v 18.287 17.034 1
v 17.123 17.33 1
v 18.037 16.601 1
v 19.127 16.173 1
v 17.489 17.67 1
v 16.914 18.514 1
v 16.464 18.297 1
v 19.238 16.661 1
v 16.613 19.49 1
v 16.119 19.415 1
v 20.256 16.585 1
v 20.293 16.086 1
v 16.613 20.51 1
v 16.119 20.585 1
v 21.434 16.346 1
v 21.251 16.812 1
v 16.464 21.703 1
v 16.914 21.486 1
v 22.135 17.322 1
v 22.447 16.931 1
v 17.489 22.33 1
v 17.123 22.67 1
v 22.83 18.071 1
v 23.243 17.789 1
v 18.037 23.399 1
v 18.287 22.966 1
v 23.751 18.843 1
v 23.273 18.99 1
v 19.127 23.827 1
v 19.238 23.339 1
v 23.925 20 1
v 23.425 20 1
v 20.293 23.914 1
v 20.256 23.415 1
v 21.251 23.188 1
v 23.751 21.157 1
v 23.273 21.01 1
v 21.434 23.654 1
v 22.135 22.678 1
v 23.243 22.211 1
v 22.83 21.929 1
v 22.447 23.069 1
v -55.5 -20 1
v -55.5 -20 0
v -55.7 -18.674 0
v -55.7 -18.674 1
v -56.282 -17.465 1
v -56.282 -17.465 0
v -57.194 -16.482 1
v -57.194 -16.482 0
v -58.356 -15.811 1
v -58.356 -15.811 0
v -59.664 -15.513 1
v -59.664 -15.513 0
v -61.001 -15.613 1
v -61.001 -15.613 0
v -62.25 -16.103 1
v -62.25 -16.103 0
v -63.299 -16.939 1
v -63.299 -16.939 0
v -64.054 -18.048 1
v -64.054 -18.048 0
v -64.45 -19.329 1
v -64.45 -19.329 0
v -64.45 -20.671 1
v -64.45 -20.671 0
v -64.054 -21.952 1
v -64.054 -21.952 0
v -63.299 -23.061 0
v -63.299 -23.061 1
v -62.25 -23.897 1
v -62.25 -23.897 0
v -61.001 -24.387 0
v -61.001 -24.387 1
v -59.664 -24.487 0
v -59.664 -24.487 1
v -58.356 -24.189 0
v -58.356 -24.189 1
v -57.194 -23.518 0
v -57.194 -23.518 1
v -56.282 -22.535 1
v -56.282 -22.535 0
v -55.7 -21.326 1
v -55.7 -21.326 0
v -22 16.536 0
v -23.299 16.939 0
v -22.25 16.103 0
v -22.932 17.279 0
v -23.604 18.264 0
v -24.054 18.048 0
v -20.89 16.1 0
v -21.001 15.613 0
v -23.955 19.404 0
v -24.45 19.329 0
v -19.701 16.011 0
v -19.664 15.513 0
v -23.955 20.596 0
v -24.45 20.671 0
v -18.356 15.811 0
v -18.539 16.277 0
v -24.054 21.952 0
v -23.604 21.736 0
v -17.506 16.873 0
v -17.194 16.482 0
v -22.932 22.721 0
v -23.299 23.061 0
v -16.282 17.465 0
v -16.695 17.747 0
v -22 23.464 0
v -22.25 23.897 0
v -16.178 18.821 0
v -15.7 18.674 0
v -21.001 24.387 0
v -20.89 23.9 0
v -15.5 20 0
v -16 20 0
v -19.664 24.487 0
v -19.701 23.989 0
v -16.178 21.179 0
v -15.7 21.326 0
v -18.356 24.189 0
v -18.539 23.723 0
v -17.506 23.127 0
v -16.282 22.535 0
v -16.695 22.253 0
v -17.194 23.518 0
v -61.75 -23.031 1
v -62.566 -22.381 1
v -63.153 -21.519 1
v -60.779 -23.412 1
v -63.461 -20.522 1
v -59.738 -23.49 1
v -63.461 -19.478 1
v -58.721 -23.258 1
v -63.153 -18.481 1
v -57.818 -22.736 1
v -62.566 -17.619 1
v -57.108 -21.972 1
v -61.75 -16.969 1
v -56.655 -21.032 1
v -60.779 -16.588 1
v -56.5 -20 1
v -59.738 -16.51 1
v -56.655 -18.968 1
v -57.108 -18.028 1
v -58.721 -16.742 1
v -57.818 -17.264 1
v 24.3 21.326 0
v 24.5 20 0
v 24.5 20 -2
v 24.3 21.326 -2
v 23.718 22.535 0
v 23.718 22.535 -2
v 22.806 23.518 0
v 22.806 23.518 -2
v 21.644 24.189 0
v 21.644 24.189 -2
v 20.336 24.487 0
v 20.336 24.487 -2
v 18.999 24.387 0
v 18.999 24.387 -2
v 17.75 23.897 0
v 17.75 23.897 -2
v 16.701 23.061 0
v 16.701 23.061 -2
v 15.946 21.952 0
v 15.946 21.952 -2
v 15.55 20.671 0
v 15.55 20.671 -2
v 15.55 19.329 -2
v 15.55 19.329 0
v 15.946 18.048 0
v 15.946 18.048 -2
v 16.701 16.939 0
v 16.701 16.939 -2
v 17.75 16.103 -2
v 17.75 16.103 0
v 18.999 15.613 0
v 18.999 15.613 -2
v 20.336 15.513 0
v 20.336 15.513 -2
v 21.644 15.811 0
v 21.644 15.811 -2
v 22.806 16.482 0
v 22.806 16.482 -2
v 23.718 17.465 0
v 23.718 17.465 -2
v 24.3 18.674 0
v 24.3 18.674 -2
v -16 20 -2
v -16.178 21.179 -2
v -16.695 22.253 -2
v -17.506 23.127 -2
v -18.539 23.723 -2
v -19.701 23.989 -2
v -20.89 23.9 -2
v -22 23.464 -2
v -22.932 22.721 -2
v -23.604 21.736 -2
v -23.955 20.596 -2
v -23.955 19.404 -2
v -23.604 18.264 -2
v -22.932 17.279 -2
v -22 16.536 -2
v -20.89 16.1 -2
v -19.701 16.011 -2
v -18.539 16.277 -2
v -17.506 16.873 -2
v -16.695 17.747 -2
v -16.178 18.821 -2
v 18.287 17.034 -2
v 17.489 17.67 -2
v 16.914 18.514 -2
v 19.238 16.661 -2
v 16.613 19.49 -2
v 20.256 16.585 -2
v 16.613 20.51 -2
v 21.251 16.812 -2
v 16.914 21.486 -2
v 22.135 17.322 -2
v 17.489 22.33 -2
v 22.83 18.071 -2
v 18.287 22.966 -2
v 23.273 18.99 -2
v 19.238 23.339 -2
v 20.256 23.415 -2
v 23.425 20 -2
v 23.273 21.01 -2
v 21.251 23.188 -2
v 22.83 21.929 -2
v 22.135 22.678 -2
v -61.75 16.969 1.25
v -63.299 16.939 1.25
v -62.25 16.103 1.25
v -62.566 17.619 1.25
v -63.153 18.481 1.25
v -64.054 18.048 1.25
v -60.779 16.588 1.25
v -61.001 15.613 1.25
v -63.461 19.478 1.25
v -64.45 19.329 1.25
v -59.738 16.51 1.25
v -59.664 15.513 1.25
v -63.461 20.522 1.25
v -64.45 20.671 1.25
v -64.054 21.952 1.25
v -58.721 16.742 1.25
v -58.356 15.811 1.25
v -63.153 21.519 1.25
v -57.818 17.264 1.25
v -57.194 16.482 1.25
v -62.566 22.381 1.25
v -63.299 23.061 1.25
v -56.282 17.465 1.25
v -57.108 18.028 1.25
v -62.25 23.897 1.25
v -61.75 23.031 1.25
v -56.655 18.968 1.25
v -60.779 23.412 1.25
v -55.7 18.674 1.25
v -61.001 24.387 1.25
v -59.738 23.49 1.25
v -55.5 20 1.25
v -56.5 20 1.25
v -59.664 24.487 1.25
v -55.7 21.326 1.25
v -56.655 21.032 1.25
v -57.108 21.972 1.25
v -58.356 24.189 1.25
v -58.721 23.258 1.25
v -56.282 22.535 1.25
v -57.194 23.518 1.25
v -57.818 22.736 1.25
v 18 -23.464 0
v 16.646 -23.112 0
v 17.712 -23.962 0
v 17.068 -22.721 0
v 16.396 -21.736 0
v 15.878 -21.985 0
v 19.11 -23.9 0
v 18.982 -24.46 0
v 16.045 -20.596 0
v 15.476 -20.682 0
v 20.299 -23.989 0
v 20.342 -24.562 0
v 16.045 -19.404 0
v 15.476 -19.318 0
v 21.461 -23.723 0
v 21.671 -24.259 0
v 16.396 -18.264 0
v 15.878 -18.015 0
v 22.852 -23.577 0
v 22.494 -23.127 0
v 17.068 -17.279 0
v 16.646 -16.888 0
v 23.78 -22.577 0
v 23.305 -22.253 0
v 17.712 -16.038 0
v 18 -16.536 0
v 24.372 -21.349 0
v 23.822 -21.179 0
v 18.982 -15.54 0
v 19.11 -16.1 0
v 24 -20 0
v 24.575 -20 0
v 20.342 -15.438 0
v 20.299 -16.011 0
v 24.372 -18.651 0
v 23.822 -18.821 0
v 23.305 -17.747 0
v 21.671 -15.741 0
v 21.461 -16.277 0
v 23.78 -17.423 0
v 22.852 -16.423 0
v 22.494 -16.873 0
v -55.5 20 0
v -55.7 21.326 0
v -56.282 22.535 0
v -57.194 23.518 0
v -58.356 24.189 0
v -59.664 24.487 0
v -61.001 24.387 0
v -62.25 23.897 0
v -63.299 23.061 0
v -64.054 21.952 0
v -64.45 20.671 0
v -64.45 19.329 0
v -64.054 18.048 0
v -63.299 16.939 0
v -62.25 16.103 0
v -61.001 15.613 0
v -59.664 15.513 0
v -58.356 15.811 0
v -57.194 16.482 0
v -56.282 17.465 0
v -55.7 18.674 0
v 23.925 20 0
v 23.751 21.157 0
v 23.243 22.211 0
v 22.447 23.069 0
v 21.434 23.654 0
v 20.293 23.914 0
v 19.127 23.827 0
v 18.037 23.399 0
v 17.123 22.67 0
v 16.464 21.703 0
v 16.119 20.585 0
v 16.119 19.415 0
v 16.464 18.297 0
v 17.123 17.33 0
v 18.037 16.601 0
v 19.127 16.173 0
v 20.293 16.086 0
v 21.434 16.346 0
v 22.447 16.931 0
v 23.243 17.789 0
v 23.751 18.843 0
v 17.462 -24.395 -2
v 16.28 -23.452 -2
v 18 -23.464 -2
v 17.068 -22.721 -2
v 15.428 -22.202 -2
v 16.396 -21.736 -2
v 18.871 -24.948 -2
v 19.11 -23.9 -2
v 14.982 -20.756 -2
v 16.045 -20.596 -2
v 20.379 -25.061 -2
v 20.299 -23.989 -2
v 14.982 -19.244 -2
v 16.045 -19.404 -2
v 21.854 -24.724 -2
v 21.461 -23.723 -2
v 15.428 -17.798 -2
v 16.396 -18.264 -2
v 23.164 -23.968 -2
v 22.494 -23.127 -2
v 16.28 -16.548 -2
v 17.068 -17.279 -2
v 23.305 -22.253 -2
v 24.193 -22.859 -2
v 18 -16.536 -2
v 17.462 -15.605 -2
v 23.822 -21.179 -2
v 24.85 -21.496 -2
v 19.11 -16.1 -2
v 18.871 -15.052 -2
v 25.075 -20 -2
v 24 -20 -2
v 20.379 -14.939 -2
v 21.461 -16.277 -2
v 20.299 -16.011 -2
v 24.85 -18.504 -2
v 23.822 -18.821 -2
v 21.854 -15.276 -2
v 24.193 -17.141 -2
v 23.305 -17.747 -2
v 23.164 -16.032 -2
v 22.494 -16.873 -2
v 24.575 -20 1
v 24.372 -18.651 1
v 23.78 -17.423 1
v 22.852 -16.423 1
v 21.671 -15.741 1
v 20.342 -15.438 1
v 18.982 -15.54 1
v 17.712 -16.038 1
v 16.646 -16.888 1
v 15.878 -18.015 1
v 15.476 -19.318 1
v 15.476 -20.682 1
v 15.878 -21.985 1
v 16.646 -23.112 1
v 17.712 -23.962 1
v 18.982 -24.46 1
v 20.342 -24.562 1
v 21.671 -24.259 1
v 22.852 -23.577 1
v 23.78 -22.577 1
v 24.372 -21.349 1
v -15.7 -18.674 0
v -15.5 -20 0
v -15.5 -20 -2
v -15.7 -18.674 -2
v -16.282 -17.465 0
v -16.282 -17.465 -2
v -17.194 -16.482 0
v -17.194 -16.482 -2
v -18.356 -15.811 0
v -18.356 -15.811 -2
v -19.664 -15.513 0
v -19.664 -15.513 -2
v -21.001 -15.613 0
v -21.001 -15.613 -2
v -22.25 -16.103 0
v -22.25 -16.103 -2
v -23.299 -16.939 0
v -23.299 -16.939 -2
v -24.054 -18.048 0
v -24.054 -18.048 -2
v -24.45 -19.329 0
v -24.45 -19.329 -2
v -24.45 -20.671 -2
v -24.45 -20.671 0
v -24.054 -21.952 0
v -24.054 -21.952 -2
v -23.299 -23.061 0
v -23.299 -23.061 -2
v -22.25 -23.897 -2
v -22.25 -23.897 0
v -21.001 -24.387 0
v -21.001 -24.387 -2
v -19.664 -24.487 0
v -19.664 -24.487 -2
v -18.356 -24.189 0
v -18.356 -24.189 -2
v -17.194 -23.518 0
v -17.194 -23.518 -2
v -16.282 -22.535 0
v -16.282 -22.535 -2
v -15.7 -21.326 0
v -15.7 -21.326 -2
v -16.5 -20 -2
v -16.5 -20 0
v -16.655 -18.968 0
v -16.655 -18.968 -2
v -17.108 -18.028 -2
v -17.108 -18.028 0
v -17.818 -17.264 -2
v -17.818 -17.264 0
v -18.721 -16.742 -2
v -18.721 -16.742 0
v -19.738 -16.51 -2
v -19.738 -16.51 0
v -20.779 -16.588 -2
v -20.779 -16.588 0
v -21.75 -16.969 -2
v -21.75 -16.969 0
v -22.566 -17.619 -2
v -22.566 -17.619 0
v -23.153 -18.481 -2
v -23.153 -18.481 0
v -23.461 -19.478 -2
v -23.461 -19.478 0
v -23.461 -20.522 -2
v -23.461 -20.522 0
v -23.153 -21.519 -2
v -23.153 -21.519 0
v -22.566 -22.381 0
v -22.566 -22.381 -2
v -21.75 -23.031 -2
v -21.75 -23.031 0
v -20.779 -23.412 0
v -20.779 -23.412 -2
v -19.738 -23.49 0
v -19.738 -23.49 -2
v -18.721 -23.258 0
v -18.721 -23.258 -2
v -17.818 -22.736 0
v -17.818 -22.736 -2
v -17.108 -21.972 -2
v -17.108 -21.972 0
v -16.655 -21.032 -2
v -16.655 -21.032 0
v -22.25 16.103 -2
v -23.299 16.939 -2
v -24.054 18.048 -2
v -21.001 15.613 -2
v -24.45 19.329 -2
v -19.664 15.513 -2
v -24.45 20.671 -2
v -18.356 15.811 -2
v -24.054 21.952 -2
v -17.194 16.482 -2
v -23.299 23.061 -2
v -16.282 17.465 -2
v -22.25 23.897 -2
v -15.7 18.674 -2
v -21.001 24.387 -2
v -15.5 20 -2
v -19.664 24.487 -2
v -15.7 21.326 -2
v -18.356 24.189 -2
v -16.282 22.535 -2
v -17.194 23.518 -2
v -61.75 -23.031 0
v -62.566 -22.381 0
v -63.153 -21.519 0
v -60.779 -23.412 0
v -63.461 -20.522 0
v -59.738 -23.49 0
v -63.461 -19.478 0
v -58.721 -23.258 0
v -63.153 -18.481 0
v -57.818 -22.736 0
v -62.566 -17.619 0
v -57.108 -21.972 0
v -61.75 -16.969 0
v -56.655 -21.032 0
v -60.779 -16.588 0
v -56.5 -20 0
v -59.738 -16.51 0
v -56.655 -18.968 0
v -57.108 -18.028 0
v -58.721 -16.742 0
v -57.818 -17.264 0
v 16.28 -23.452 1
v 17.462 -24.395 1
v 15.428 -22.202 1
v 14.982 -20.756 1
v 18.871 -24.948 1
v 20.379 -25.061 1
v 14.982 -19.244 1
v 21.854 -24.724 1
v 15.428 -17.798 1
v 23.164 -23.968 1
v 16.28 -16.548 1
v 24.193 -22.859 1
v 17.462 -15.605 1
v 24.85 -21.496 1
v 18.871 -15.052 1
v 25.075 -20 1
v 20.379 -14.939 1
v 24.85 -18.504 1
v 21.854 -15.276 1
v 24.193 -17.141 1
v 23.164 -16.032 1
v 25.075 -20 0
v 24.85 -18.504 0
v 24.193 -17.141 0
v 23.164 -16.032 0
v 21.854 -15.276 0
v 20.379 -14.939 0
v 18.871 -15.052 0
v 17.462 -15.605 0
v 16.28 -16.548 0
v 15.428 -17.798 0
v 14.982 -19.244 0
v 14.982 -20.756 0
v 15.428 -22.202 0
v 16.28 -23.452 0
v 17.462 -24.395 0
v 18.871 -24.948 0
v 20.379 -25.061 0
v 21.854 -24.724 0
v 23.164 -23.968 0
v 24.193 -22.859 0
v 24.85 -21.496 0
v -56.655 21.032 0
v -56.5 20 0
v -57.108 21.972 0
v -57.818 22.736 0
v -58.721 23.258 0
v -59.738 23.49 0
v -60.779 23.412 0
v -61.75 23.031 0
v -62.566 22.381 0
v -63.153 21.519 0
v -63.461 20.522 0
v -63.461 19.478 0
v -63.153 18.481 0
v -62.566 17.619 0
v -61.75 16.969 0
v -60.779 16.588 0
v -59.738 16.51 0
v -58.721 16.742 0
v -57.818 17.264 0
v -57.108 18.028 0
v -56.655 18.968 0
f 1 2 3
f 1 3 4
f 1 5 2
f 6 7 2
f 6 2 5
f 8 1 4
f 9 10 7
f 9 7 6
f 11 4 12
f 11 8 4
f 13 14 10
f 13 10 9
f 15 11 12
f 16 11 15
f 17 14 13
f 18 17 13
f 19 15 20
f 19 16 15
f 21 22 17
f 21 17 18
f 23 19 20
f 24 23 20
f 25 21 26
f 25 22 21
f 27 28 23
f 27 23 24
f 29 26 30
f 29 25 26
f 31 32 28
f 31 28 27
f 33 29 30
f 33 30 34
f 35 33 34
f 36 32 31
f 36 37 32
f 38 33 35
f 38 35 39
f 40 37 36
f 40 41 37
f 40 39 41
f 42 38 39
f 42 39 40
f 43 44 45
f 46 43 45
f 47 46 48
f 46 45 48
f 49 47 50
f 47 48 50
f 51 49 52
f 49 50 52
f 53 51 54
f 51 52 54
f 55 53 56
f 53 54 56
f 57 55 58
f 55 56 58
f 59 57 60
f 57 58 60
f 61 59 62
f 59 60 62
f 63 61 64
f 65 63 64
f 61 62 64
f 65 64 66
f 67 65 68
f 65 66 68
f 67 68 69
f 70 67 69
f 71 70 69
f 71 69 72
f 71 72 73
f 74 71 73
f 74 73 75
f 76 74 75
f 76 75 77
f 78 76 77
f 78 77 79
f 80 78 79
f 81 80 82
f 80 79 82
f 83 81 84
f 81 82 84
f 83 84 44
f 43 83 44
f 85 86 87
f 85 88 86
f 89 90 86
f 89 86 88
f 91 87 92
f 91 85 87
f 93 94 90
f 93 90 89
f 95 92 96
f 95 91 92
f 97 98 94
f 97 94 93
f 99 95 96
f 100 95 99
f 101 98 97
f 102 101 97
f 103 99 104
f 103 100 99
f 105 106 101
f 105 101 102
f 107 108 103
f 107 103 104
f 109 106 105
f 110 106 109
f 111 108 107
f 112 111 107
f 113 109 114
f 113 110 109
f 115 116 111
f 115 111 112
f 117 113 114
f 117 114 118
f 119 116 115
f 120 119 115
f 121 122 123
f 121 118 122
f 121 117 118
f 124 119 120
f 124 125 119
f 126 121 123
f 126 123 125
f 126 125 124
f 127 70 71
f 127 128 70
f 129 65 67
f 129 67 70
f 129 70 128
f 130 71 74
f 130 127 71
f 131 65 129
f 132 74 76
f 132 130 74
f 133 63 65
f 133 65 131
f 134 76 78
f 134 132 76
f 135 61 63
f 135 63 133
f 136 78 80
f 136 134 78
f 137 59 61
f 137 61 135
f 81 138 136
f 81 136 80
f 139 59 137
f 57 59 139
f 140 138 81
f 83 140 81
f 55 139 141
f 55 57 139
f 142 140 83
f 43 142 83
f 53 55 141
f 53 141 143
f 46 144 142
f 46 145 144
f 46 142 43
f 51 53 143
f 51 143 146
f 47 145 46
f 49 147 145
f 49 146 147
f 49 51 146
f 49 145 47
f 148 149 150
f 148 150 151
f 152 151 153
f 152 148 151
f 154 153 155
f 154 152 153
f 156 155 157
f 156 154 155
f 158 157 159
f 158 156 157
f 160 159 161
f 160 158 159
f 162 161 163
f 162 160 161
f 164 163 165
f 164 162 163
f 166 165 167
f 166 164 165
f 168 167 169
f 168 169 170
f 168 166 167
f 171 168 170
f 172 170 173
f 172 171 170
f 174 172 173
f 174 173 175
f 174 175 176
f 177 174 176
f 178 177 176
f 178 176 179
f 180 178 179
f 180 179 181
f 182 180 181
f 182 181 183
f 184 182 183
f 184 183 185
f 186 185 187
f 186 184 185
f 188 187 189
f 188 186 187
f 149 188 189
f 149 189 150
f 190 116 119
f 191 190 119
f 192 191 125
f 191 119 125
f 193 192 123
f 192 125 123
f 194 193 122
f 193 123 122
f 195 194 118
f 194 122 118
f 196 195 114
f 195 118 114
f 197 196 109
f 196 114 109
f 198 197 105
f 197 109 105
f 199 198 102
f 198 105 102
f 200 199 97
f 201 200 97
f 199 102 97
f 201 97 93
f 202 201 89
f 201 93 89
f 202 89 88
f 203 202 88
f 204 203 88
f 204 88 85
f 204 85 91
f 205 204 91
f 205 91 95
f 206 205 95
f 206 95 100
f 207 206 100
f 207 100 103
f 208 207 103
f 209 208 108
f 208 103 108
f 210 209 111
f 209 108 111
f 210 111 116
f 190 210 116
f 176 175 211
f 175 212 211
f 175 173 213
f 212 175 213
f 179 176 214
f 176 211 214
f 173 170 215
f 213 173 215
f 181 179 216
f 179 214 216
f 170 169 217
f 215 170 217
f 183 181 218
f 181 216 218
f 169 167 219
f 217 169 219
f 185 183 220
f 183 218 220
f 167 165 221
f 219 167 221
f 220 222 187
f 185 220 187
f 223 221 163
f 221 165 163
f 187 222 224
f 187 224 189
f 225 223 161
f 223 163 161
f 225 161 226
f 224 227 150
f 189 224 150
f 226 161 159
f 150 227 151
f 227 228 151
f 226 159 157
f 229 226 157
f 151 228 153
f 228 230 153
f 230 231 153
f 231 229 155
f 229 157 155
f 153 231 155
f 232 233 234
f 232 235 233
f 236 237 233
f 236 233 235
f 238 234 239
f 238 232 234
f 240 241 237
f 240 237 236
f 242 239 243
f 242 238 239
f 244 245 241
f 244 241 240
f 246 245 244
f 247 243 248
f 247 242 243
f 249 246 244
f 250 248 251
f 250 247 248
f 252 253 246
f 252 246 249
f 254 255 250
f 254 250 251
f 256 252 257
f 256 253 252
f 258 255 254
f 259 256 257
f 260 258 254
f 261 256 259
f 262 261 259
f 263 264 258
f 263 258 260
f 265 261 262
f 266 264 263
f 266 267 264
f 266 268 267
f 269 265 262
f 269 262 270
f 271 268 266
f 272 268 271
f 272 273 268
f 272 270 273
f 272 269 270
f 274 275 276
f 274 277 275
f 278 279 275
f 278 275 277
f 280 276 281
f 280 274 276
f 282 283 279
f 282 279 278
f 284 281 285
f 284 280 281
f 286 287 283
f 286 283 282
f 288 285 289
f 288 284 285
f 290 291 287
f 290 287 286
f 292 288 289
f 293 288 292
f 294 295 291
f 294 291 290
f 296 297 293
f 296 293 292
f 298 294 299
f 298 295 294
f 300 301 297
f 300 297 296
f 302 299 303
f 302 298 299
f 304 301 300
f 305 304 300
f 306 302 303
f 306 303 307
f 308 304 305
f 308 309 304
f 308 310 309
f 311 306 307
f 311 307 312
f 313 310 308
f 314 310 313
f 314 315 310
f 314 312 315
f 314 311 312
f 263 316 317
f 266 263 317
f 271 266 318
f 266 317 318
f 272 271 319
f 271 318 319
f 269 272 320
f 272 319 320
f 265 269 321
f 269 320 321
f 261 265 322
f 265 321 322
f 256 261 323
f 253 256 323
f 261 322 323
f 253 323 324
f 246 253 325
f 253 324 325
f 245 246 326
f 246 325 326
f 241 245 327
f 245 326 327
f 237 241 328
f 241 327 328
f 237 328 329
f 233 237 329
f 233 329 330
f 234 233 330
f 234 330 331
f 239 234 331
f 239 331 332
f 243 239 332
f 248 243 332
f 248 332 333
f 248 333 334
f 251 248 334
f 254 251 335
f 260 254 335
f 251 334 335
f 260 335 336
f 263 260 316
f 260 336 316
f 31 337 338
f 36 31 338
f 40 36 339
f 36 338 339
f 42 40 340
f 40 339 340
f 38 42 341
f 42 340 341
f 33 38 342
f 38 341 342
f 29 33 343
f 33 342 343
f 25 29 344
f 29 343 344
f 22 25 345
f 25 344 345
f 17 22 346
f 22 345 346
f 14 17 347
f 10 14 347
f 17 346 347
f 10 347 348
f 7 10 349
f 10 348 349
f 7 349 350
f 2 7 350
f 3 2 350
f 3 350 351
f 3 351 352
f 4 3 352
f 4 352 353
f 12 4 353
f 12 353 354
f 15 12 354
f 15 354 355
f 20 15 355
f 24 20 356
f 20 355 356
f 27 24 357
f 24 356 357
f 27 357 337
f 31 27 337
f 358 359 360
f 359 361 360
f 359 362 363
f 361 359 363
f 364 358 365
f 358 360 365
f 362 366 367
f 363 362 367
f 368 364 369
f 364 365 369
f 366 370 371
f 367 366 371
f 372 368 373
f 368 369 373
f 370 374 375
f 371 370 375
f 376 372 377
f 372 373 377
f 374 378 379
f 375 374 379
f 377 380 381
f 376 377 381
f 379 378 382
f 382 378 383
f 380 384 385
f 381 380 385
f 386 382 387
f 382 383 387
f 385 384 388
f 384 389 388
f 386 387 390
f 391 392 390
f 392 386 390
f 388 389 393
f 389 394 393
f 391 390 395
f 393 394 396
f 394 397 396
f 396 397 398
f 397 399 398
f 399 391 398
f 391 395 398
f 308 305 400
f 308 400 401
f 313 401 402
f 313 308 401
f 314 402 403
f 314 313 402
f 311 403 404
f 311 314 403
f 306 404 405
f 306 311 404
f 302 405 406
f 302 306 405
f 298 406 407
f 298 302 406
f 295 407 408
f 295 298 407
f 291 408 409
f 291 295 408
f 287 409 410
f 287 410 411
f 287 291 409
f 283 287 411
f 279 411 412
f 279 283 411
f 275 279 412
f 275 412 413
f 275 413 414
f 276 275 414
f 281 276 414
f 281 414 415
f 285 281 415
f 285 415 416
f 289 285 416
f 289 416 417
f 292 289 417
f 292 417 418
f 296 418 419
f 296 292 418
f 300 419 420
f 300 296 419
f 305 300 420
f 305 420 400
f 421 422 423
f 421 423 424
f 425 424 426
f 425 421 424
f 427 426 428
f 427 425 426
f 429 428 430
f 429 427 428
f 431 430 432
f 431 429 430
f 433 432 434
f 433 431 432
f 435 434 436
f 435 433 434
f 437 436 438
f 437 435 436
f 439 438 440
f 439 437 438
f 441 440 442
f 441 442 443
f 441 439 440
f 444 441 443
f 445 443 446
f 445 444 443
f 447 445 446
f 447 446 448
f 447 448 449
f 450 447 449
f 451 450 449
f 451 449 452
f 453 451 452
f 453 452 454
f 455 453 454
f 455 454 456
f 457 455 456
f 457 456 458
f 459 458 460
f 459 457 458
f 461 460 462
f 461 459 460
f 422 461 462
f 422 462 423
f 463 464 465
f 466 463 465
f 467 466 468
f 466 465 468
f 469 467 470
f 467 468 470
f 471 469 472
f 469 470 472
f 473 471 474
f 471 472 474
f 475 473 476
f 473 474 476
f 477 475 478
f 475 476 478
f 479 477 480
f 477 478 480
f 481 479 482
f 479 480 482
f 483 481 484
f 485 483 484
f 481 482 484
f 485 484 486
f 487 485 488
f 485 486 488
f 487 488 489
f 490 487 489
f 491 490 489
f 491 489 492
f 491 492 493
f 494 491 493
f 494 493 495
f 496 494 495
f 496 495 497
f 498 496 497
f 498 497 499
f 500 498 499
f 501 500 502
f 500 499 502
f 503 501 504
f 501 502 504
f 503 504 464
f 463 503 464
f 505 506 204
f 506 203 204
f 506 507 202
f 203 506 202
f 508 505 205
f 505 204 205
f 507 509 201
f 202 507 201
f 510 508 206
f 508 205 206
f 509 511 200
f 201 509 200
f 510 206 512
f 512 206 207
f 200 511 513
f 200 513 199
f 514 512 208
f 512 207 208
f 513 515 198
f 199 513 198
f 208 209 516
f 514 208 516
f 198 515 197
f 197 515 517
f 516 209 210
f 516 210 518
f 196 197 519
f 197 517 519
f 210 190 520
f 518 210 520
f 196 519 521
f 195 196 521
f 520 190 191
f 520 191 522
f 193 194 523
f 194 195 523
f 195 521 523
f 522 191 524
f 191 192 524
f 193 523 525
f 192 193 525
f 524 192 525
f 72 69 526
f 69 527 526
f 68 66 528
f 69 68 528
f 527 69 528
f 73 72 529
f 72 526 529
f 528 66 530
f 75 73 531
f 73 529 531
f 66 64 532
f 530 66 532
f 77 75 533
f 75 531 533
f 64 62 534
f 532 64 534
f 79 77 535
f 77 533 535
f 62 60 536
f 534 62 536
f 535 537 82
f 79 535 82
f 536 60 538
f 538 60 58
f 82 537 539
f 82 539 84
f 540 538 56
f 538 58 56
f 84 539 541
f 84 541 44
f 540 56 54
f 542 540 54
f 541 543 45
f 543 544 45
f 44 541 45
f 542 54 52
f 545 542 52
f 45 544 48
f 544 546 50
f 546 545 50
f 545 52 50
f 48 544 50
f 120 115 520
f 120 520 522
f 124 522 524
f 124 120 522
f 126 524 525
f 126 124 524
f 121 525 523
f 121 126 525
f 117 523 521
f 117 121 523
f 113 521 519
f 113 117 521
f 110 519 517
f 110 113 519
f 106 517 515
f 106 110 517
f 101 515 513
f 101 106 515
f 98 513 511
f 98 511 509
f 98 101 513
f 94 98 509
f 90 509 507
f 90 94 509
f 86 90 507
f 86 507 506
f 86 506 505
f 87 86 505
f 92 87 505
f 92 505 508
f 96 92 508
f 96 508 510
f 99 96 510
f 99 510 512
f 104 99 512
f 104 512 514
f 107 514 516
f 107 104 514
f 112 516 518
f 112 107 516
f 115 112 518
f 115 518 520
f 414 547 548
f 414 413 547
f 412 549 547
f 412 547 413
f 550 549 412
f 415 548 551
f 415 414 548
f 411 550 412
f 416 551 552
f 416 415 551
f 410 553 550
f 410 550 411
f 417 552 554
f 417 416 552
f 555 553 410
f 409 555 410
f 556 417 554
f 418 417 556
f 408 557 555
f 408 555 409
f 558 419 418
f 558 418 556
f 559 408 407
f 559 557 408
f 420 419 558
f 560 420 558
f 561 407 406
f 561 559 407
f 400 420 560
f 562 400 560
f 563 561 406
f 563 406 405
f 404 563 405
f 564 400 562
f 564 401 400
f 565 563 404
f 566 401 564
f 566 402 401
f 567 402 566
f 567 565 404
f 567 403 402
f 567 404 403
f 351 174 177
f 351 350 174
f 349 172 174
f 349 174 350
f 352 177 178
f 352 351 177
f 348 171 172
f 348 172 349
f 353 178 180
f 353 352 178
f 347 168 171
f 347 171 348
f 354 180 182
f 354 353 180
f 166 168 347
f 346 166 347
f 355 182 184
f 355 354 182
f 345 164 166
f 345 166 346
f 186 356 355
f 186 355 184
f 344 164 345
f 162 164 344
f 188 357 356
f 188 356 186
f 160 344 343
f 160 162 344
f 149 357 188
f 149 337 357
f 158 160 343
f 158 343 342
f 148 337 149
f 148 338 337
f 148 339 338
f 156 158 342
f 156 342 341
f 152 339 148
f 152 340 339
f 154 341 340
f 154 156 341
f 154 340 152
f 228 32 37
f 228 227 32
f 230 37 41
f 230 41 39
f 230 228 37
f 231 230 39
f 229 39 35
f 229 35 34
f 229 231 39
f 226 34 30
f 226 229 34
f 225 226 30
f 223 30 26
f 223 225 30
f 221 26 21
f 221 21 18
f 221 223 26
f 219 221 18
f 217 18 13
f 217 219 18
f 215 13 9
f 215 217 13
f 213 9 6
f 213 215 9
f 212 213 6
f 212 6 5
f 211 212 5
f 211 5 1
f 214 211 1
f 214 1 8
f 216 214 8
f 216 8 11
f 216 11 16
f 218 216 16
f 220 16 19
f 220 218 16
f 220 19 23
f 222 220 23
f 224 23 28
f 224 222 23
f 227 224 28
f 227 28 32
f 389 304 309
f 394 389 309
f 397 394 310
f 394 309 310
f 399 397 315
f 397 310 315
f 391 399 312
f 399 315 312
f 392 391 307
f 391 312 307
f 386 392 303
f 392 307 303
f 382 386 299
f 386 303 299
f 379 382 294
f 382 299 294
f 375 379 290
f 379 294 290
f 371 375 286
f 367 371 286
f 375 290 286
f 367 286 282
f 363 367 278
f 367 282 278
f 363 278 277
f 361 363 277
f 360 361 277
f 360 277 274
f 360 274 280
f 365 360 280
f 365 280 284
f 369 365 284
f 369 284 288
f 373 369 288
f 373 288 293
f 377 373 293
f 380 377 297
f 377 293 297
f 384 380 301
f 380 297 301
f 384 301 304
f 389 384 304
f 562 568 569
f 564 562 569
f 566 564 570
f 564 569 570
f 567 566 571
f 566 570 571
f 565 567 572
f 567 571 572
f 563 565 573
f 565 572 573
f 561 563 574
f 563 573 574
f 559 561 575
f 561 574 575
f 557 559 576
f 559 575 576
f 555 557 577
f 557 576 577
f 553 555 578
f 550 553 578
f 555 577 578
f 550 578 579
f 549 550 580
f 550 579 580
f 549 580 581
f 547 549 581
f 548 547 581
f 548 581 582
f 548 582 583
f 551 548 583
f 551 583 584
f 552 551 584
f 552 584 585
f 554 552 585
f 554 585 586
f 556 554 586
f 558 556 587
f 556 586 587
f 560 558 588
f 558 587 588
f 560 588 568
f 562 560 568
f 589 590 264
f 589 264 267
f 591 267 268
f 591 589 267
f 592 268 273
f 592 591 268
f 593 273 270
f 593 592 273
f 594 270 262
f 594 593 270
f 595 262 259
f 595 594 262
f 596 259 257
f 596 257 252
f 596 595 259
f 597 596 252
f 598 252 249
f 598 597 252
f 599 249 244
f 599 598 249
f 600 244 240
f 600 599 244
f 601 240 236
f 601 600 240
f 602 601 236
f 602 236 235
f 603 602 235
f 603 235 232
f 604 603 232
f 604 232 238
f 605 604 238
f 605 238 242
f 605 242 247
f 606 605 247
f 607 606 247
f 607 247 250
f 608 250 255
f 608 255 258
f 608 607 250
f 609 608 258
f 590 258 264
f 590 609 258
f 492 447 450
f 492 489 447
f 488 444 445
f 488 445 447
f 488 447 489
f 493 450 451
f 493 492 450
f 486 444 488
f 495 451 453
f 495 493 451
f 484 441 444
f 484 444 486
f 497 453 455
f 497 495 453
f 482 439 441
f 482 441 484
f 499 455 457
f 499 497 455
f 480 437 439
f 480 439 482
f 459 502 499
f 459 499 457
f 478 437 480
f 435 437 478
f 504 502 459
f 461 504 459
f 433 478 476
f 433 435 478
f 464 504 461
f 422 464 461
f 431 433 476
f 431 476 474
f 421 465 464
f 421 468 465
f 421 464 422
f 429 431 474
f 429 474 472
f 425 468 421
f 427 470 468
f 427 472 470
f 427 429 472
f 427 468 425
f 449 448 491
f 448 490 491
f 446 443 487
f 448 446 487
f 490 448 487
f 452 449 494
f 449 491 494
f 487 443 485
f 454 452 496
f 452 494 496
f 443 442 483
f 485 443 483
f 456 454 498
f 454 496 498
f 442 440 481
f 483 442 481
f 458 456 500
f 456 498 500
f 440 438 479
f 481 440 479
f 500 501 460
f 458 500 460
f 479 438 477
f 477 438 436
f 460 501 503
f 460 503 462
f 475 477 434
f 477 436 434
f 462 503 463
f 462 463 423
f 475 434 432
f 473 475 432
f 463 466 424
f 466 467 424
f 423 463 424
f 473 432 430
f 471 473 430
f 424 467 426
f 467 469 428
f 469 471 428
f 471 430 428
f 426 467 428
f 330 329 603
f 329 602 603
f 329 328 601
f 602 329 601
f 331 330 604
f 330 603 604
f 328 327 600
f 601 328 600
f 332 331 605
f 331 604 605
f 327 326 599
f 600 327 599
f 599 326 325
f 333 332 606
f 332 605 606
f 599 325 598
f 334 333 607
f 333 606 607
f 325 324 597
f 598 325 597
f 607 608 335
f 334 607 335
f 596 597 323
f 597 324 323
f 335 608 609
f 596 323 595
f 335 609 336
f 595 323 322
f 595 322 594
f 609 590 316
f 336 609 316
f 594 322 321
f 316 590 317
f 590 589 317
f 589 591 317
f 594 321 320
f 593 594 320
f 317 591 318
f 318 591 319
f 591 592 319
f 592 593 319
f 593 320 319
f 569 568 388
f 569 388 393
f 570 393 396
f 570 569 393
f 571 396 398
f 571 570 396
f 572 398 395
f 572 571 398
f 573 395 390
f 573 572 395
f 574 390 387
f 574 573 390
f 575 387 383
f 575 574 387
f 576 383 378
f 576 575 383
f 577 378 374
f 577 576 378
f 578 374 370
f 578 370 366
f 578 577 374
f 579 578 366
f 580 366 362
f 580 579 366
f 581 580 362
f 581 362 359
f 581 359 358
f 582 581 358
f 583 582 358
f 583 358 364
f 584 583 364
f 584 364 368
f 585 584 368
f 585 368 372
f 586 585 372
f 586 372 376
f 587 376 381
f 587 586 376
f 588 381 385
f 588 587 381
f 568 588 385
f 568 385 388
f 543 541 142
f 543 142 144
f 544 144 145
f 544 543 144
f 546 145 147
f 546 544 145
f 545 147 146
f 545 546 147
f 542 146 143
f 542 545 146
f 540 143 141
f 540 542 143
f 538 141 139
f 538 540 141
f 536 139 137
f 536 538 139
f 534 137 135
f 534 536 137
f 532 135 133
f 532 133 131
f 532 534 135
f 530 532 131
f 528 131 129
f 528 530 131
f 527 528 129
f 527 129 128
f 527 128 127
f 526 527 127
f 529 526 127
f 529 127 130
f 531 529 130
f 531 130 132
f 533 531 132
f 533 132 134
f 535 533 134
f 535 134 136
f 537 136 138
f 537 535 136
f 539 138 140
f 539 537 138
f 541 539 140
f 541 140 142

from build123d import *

# Parameters (mm, degrees)
F0_R     = 4.5
F0_R_2   = 4
F1_DEPTH = 2
F0_R_3   = 3.5
F0_R_4   = 5.075
F0_R_5   = 4.575
F0_R_6   = 3.925
F0_R_7   = 3.425
F2_DEPTH = 1
F3_DEPTH = 1.25
F4_DEPTH = 1


with BuildPart() as f1:
    # F0 (on Top) → F1 (new body)
    with BuildSketch(Plane.XY):
        with Locations((-20, 20)):
            Circle(F0_R)
        with Locations((-20, 20)):
            Circle(F0_R_2, mode=Mode.SUBTRACT)
    extrude(amount=-F1_DEPTH)


with BuildPart() as f1b:
    # F0 (on Top) → F1, piece 2 (new body)
    with BuildSketch(Plane.XY):
        with Locations((-20, -20)):
            Circle(F0_R)
        with Locations((-20, -20)):
            Circle(F0_R_3, mode=Mode.SUBTRACT)
    extrude(amount=-F1_DEPTH)


with BuildPart() as f1c:
    # F0 (on Top) → F1, piece 3 (new body)
    with BuildSketch(Plane.XY):
        with Locations((20, -20)):
            Circle(F0_R_4)
        with Locations((20, -20)):
            Circle(F0_R_5, mode=Mode.SUBTRACT)
        with Locations((20, -20)):
            Circle(F0_R_5)
        with Locations((20, -20)):
            Circle(F0_R_2, mode=Mode.SUBTRACT)
    extrude(amount=-F1_DEPTH)

    # F0 (on Top) → F2, piece 2 (join)
    with BuildSketch(Plane.XY):
        with Locations((20, -20)):
            Circle(F0_R_4)
        with Locations((20, -20)):
            Circle(F0_R_5, mode=Mode.SUBTRACT)
    extrude(amount=F2_DEPTH)


with BuildPart() as f1d:
    # F0 (on Top) → F1, piece 4 (new body)
    with BuildSketch(Plane.XY):
        with Locations((20, 20)):
            Circle(F0_R)
        with Locations((20, 20)):
            Circle(F0_R_6, mode=Mode.SUBTRACT)
        with Locations((20, 20)):
            Circle(F0_R_6)
        with Locations((20, 20)):
            Circle(F0_R_7, mode=Mode.SUBTRACT)
    extrude(amount=-F1_DEPTH)

    # F0 (on Top) → F2 (join)
    with BuildSketch(Plane.XY):
        with Locations((20, 20)):
            Circle(F0_R_6)
        with Locations((20, 20)):
            Circle(F0_R_7, mode=Mode.SUBTRACT)
    extrude(amount=F2_DEPTH)


with BuildPart() as f3:
    # F0 (on Top) → F3 (new body)
    with BuildSketch(Plane.XY):
        with Locations((-60, 20)):
            Circle(F0_R)
        with Locations((-60, 20)):
            Circle(F0_R_3, mode=Mode.SUBTRACT)
    extrude(amount=F3_DEPTH)


with BuildPart() as f4:
    # F0 (on Top) → F4 (new body)
    with BuildSketch(Plane.XY):
        with Locations((-60, -20)):
            Circle(F0_R)
        with Locations((-60, -20)):
            Circle(F0_R_3, mode=Mode.SUBTRACT)
    extrude(amount=F4_DEPTH)


solid = Compound([f1.part, f1b.part, f1c.part, f1d.part, f3.part, f4.part])
